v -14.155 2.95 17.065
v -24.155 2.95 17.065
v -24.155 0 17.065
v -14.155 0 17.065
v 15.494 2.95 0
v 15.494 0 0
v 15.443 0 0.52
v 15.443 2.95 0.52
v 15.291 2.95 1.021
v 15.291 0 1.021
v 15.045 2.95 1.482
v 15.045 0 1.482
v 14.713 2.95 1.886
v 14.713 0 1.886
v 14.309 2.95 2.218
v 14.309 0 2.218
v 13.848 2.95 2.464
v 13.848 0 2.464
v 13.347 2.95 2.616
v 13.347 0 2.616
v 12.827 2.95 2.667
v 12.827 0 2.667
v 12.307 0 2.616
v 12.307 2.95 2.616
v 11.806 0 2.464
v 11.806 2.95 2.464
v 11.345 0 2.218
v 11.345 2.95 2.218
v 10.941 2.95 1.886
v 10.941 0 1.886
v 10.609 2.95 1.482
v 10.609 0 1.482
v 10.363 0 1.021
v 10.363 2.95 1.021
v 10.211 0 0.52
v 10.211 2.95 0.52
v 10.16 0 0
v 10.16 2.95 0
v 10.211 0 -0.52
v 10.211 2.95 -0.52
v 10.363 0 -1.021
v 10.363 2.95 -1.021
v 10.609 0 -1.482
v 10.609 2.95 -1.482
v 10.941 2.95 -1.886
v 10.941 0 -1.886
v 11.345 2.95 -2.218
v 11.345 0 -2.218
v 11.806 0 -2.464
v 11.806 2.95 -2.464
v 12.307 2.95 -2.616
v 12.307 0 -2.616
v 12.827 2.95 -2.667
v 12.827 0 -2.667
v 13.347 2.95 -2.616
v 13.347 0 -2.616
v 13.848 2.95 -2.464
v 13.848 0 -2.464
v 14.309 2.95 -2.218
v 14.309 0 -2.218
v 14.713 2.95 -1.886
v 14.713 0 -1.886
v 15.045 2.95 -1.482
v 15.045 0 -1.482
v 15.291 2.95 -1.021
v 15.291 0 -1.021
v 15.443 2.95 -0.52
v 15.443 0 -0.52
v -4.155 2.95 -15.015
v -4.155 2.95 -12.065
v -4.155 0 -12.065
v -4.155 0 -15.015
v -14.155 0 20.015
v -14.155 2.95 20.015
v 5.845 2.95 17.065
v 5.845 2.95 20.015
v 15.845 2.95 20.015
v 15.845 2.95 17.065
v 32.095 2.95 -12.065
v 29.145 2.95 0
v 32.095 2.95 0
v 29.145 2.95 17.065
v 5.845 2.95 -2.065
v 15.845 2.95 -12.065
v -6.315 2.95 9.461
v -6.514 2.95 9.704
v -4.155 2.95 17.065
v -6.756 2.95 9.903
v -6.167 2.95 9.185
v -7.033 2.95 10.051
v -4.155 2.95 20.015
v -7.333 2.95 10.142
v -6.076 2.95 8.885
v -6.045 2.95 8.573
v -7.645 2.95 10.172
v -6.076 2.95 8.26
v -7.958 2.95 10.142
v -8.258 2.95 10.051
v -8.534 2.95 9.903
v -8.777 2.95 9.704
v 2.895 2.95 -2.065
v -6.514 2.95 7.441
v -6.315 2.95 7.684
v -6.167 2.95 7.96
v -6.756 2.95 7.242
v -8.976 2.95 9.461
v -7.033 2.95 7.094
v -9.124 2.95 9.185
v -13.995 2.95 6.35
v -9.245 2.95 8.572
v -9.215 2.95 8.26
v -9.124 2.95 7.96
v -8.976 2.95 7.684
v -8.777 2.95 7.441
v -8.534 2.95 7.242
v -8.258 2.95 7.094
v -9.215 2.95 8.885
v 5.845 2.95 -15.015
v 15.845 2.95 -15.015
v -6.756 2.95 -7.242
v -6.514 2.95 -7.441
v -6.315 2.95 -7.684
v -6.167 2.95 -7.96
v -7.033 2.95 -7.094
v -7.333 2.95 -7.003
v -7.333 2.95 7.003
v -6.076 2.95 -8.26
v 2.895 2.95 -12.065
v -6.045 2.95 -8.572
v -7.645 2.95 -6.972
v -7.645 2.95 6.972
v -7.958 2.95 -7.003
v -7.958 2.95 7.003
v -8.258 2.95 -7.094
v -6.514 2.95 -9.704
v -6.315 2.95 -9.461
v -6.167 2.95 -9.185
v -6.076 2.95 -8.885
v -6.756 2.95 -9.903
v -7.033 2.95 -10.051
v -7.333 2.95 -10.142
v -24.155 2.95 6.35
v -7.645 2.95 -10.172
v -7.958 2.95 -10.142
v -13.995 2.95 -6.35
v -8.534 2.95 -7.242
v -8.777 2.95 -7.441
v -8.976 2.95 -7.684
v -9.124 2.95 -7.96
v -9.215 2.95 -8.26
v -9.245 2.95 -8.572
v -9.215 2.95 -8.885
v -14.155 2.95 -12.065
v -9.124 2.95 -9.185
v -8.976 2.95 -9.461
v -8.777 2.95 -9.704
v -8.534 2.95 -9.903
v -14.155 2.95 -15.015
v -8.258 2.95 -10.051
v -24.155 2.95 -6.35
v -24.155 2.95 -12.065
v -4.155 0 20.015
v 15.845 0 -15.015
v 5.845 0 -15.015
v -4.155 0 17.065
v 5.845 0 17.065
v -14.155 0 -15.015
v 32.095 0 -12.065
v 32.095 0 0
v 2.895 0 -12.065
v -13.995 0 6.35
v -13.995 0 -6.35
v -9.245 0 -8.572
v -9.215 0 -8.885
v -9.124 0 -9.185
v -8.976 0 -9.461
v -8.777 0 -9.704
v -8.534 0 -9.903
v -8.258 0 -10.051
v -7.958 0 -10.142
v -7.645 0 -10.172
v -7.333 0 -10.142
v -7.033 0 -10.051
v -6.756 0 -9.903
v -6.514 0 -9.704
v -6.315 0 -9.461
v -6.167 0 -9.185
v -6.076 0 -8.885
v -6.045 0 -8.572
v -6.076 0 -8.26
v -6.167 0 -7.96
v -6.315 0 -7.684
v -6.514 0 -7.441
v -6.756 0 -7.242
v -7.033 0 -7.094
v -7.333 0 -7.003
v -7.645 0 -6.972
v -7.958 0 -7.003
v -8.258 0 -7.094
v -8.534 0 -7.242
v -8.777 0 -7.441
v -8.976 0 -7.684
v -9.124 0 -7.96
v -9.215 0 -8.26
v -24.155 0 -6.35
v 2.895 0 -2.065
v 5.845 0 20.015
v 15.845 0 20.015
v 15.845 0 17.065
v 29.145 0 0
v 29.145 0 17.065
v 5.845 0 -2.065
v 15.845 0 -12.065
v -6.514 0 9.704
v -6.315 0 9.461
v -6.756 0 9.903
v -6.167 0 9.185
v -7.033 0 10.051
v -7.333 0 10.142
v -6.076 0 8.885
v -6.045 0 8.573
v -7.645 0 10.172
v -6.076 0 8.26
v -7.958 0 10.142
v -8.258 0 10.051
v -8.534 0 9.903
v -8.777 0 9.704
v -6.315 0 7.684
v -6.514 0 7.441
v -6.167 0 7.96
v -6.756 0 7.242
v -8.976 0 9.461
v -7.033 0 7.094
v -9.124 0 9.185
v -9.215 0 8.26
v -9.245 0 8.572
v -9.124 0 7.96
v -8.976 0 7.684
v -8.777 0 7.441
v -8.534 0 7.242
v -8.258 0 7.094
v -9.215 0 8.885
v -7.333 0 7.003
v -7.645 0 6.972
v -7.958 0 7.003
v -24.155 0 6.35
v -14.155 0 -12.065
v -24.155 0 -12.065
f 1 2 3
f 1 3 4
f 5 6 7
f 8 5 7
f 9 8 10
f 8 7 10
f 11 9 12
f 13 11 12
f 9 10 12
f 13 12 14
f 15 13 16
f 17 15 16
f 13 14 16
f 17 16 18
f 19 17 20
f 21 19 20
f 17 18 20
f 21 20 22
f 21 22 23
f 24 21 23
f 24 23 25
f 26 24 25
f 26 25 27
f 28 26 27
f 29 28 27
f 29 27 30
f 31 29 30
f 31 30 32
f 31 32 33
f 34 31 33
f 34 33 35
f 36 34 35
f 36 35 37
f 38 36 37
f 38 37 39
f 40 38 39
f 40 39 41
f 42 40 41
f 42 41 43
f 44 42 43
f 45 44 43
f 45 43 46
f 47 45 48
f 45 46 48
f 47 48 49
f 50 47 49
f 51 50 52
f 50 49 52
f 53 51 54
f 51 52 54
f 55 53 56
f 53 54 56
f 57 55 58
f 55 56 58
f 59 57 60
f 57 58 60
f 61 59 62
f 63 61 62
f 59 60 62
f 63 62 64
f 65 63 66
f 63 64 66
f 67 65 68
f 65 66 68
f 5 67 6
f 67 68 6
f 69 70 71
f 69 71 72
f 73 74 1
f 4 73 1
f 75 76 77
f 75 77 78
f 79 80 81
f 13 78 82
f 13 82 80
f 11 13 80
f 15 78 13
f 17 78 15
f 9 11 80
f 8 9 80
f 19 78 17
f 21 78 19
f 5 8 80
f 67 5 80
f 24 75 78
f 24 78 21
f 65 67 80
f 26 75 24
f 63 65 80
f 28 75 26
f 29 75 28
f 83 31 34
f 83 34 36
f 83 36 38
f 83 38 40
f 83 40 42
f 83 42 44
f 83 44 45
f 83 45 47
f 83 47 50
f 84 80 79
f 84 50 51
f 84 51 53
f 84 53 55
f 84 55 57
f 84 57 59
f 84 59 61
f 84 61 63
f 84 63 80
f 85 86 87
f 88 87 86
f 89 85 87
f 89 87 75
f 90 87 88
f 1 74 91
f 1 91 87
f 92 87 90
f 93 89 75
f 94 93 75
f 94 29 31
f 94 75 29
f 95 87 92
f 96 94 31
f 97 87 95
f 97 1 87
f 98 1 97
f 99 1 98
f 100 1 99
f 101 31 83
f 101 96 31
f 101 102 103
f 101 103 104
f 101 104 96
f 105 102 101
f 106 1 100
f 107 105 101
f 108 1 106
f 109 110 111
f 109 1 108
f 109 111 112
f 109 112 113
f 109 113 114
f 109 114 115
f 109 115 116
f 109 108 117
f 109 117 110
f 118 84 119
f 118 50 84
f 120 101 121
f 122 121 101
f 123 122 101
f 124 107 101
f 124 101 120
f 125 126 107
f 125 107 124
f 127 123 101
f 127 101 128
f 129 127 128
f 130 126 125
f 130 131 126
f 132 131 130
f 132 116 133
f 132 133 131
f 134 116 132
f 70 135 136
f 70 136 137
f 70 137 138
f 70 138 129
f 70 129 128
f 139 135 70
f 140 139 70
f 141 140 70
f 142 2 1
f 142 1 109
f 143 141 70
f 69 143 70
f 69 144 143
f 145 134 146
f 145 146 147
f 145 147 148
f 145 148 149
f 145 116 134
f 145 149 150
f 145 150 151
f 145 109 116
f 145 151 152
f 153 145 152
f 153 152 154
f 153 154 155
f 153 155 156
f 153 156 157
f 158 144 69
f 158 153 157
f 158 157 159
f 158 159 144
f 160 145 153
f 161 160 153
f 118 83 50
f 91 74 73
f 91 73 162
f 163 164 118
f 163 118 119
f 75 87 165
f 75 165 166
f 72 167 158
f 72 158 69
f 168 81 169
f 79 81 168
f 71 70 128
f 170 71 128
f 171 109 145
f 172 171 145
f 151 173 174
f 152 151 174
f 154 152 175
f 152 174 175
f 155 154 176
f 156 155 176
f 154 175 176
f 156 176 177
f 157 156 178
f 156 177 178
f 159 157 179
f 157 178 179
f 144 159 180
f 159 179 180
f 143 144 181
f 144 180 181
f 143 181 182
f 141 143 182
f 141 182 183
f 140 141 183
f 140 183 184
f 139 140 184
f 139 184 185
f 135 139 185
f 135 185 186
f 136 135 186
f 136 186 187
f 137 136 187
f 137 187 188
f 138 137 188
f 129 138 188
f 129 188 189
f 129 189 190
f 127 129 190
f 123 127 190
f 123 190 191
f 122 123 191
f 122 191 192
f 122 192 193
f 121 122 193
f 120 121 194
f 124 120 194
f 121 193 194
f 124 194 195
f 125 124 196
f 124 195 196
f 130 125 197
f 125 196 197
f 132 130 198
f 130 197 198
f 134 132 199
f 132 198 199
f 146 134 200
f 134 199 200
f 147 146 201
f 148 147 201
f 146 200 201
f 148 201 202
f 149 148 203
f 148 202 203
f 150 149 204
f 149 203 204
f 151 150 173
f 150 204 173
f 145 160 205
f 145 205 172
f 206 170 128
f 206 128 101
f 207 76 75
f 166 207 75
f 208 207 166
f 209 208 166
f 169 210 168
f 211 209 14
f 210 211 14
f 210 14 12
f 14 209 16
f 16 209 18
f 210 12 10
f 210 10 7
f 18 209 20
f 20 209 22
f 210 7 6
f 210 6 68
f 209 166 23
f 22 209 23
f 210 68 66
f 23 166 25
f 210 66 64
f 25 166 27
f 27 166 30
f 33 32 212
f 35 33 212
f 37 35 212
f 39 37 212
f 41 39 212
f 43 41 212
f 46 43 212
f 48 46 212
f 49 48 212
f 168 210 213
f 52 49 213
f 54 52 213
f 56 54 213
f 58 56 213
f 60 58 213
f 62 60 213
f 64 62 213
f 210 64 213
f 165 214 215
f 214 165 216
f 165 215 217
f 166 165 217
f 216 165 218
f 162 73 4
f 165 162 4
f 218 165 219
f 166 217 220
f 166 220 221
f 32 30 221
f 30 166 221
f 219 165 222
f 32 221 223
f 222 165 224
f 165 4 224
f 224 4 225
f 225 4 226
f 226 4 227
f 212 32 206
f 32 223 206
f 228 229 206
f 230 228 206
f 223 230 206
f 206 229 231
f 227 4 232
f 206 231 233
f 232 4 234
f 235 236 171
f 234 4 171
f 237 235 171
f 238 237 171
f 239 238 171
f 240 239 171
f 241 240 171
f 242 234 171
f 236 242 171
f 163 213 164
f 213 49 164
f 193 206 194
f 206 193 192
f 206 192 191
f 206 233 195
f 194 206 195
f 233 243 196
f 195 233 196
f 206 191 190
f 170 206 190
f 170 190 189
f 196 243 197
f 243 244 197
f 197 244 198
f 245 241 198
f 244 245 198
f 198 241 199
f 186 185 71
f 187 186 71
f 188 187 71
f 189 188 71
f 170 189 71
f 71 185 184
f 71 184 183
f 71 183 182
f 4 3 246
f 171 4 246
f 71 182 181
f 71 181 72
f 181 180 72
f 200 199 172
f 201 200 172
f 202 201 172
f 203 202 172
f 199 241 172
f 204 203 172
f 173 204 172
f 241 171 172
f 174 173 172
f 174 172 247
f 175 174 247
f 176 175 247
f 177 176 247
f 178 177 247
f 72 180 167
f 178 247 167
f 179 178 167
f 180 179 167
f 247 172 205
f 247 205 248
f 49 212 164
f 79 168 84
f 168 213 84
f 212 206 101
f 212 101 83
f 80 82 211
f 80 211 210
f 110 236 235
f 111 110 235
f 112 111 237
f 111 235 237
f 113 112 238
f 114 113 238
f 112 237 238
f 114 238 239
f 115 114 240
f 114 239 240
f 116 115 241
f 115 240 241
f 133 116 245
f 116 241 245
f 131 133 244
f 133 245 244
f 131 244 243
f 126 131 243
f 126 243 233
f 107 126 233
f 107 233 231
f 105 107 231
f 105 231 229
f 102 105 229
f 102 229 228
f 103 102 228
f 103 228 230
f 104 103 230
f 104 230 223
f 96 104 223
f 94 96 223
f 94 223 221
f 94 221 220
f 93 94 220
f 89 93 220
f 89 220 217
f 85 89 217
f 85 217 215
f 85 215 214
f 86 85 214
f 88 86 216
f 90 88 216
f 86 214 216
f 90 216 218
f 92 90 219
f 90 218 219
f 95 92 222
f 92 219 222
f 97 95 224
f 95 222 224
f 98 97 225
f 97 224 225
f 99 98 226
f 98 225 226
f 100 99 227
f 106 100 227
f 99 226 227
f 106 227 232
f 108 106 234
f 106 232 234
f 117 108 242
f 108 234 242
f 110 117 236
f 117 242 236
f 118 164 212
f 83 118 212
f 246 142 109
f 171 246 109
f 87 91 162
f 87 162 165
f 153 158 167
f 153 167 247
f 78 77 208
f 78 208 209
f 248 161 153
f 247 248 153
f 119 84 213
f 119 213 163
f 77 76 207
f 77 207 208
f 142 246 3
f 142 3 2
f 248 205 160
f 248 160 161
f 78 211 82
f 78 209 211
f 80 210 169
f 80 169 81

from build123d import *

# Parameters (mm, degrees)
SKETCH1_W               = 48.3108
SKETCH1_H               = 30.03
BOSS_EXTRUDE1_DEPTH     = 2.95
SKETCH2_W               = 10.16
SKETCH2_H               = 12.7
CUT_EXTRUDE1_DEPTH      = 3.95
M3_CLEARANCE_HOLE1_D    = 3.2
SKETCH7_W               = 48.3108
SKETCH7_H               = 2.95
BOSS_EXTRUDE2_DEPTH     = 5
SKETCH6_W               = 10
SKETCH6_H               = 2.95
CUT_EXTRUDE2_DEPTH      = 3.95
LPATTERN1_COUNT         = 3
LPATTERN1_PITCH         = 20
MIRROR1_COPY_1_SKETCH_W = 10
MIRROR1_COPY_1_SKETCH_H = 2.95
MIRROR1_COPY_1_DEPTH    = 3.95
MIRROR1_COPY_2_SKETCH_W = 10
MIRROR1_COPY_2_SKETCH_H = 2.95
MIRROR1_COPY_2_DEPTH    = 3.95
SKETCH8_W               = 12.065
SKETCH8_H               = 2.95
BOSS_EXTRUDE3_DEPTH     = 7.9392
SKETCH9_W               = 17.065
SKETCH9_H               = 2.95
BOSS_EXTRUDE4_DEPTH     = 4.9892
SKETCH10_R              = 2.667
CUT_EXTRUDE3_DEPTH      = 3.95
SKETCH11_W              = 2.95
SKETCH11_H              = 10
CUT_EXTRUDE4_DEPTH      = 3.95


with BuildPart() as part:
    # Sketch1 → Boss-Extrude1 (new body)
    with BuildSketch(Plane(origin=(0, 0, 0), x_dir=(1, 0, 0), z_dir=(0, 1, 0))):
        Rectangle(SKETCH1_W, SKETCH1_H)
    extrude(amount=BOSS_EXTRUDE1_DEPTH)

    # Sketch2 → Cut-Extrude1 (cut, through all)
    with BuildSketch(Plane(origin=(0, 2.95, 0), x_dir=(1, 0, 0), z_dir=(0, 1, 0))):
        with Locations((-19.0754, 0)):
            Rectangle(SKETCH2_W, SKETCH2_H)
    extrude(amount=-CUT_EXTRUDE1_DEPTH, mode=Mode.SUBTRACT)

    # M3 Clearance Hole1 (through all)
    with Locations(Plane(origin=(0, 2.95, 0), x_dir=(1, 0, 0), z_dir=(0, 1, 0))):
        with Locations((-7.6454, 8.5725), (-7.6454, -8.5725)):
            Hole(M3_CLEARANCE_HOLE1_D / 2)

    # Sketch7 → Boss-Extrude2 (add)
    with BuildSketch(Plane.XY.offset(15.015)):
        with Locations((0, 1.475)):
            Rectangle(SKETCH7_W, SKETCH7_H)
    extrude(amount=BOSS_EXTRUDE2_DEPTH)

    # Sketch6 → Cut-Extrude2 (cut, through all)
    with BuildSketch(Plane(origin=(0, 2.95, 0), x_dir=(1, 0, 0), z_dir=(0, 1, 0))):
        with Locations((-19.1554, -18.54)):
            Rectangle(SKETCH6_W, SKETCH6_H)
    cut_extrude2 = extrude(amount=-CUT_EXTRUDE2_DEPTH, mode=Mode.SUBTRACT)

    # LPattern1: Cut-Extrude2 ×3
    with Locations(*[(i * LPATTERN1_PITCH, 0, 0) for i in range(1, LPATTERN1_COUNT)]):
        add(cut_extrude2, mode=Mode.SUBTRACT)

    # Mirror1: Cut-Extrude2 across plane
    add(cut_extrude2.mirror(Plane.XY.offset(2.5)), mode=Mode.SUBTRACT)

    # Mirror1 copy 1 sketch → Mirror1 copy 1 (cut, through all)
    with BuildSketch(Plane(origin=(20, 2.95, 5), x_dir=(1, 0, 0), z_dir=(0, 1, 0))):
        with Locations((-19.1554, 18.54)):
            Rectangle(MIRROR1_COPY_1_SKETCH_W, MIRROR1_COPY_1_SKETCH_H)
    extrude(amount=-MIRROR1_COPY_1_DEPTH, mode=Mode.SUBTRACT)

    # Mirror1 copy 2 sketch → Mirror1 copy 2 (cut, through all)
    with BuildSketch(Plane(origin=(40, 2.95, 5), x_dir=(1, 0, 0), z_dir=(0, 1, 0))):
        with Locations((-19.1554, 18.54)):
            Rectangle(MIRROR1_COPY_2_SKETCH_W, MIRROR1_COPY_2_SKETCH_H)
    extrude(amount=-MIRROR1_COPY_2_DEPTH, mode=Mode.SUBTRACT)

    # Sketch8 → Boss-Extrude3 (add)
    with BuildSketch(Plane(origin=(24.1554, 0, 0), x_dir=(0, 0, -1), z_dir=(1, 0, 0))):
        with Locations((6.0325, 1.475)):
            Rectangle(SKETCH8_W, SKETCH8_H)
    extrude(amount=BOSS_EXTRUDE3_DEPTH)

    # Sketch9 → Boss-Extrude4 (add)
    with BuildSketch(Plane(origin=(24.1554, 0, 0), x_dir=(0, 0, -1), z_dir=(1, 0, 0))):
        with Locations((-8.5325, 1.475)):
            Rectangle(SKETCH9_W, SKETCH9_H)
    extrude(amount=BOSS_EXTRUDE4_DEPTH)

    # Sketch10 → Cut-Extrude3 (cut, through all)
    with BuildSketch(Plane.XZ):
        with Locations((12.827, 0)):
            Circle(SKETCH10_R)
    extrude(amount=-CUT_EXTRUDE3_DEPTH, mode=Mode.SUBTRACT)

    # Sketch11 → Cut-Extrude4 (cut, through all)
    with BuildSketch(Plane.XZ):
        with Locations((4.3696, -7.065)):
            Rectangle(SKETCH11_W, SKETCH11_H)
    extrude(amount=-CUT_EXTRUDE4_DEPTH, mode=Mode.SUBTRACT)


solid = part.part
